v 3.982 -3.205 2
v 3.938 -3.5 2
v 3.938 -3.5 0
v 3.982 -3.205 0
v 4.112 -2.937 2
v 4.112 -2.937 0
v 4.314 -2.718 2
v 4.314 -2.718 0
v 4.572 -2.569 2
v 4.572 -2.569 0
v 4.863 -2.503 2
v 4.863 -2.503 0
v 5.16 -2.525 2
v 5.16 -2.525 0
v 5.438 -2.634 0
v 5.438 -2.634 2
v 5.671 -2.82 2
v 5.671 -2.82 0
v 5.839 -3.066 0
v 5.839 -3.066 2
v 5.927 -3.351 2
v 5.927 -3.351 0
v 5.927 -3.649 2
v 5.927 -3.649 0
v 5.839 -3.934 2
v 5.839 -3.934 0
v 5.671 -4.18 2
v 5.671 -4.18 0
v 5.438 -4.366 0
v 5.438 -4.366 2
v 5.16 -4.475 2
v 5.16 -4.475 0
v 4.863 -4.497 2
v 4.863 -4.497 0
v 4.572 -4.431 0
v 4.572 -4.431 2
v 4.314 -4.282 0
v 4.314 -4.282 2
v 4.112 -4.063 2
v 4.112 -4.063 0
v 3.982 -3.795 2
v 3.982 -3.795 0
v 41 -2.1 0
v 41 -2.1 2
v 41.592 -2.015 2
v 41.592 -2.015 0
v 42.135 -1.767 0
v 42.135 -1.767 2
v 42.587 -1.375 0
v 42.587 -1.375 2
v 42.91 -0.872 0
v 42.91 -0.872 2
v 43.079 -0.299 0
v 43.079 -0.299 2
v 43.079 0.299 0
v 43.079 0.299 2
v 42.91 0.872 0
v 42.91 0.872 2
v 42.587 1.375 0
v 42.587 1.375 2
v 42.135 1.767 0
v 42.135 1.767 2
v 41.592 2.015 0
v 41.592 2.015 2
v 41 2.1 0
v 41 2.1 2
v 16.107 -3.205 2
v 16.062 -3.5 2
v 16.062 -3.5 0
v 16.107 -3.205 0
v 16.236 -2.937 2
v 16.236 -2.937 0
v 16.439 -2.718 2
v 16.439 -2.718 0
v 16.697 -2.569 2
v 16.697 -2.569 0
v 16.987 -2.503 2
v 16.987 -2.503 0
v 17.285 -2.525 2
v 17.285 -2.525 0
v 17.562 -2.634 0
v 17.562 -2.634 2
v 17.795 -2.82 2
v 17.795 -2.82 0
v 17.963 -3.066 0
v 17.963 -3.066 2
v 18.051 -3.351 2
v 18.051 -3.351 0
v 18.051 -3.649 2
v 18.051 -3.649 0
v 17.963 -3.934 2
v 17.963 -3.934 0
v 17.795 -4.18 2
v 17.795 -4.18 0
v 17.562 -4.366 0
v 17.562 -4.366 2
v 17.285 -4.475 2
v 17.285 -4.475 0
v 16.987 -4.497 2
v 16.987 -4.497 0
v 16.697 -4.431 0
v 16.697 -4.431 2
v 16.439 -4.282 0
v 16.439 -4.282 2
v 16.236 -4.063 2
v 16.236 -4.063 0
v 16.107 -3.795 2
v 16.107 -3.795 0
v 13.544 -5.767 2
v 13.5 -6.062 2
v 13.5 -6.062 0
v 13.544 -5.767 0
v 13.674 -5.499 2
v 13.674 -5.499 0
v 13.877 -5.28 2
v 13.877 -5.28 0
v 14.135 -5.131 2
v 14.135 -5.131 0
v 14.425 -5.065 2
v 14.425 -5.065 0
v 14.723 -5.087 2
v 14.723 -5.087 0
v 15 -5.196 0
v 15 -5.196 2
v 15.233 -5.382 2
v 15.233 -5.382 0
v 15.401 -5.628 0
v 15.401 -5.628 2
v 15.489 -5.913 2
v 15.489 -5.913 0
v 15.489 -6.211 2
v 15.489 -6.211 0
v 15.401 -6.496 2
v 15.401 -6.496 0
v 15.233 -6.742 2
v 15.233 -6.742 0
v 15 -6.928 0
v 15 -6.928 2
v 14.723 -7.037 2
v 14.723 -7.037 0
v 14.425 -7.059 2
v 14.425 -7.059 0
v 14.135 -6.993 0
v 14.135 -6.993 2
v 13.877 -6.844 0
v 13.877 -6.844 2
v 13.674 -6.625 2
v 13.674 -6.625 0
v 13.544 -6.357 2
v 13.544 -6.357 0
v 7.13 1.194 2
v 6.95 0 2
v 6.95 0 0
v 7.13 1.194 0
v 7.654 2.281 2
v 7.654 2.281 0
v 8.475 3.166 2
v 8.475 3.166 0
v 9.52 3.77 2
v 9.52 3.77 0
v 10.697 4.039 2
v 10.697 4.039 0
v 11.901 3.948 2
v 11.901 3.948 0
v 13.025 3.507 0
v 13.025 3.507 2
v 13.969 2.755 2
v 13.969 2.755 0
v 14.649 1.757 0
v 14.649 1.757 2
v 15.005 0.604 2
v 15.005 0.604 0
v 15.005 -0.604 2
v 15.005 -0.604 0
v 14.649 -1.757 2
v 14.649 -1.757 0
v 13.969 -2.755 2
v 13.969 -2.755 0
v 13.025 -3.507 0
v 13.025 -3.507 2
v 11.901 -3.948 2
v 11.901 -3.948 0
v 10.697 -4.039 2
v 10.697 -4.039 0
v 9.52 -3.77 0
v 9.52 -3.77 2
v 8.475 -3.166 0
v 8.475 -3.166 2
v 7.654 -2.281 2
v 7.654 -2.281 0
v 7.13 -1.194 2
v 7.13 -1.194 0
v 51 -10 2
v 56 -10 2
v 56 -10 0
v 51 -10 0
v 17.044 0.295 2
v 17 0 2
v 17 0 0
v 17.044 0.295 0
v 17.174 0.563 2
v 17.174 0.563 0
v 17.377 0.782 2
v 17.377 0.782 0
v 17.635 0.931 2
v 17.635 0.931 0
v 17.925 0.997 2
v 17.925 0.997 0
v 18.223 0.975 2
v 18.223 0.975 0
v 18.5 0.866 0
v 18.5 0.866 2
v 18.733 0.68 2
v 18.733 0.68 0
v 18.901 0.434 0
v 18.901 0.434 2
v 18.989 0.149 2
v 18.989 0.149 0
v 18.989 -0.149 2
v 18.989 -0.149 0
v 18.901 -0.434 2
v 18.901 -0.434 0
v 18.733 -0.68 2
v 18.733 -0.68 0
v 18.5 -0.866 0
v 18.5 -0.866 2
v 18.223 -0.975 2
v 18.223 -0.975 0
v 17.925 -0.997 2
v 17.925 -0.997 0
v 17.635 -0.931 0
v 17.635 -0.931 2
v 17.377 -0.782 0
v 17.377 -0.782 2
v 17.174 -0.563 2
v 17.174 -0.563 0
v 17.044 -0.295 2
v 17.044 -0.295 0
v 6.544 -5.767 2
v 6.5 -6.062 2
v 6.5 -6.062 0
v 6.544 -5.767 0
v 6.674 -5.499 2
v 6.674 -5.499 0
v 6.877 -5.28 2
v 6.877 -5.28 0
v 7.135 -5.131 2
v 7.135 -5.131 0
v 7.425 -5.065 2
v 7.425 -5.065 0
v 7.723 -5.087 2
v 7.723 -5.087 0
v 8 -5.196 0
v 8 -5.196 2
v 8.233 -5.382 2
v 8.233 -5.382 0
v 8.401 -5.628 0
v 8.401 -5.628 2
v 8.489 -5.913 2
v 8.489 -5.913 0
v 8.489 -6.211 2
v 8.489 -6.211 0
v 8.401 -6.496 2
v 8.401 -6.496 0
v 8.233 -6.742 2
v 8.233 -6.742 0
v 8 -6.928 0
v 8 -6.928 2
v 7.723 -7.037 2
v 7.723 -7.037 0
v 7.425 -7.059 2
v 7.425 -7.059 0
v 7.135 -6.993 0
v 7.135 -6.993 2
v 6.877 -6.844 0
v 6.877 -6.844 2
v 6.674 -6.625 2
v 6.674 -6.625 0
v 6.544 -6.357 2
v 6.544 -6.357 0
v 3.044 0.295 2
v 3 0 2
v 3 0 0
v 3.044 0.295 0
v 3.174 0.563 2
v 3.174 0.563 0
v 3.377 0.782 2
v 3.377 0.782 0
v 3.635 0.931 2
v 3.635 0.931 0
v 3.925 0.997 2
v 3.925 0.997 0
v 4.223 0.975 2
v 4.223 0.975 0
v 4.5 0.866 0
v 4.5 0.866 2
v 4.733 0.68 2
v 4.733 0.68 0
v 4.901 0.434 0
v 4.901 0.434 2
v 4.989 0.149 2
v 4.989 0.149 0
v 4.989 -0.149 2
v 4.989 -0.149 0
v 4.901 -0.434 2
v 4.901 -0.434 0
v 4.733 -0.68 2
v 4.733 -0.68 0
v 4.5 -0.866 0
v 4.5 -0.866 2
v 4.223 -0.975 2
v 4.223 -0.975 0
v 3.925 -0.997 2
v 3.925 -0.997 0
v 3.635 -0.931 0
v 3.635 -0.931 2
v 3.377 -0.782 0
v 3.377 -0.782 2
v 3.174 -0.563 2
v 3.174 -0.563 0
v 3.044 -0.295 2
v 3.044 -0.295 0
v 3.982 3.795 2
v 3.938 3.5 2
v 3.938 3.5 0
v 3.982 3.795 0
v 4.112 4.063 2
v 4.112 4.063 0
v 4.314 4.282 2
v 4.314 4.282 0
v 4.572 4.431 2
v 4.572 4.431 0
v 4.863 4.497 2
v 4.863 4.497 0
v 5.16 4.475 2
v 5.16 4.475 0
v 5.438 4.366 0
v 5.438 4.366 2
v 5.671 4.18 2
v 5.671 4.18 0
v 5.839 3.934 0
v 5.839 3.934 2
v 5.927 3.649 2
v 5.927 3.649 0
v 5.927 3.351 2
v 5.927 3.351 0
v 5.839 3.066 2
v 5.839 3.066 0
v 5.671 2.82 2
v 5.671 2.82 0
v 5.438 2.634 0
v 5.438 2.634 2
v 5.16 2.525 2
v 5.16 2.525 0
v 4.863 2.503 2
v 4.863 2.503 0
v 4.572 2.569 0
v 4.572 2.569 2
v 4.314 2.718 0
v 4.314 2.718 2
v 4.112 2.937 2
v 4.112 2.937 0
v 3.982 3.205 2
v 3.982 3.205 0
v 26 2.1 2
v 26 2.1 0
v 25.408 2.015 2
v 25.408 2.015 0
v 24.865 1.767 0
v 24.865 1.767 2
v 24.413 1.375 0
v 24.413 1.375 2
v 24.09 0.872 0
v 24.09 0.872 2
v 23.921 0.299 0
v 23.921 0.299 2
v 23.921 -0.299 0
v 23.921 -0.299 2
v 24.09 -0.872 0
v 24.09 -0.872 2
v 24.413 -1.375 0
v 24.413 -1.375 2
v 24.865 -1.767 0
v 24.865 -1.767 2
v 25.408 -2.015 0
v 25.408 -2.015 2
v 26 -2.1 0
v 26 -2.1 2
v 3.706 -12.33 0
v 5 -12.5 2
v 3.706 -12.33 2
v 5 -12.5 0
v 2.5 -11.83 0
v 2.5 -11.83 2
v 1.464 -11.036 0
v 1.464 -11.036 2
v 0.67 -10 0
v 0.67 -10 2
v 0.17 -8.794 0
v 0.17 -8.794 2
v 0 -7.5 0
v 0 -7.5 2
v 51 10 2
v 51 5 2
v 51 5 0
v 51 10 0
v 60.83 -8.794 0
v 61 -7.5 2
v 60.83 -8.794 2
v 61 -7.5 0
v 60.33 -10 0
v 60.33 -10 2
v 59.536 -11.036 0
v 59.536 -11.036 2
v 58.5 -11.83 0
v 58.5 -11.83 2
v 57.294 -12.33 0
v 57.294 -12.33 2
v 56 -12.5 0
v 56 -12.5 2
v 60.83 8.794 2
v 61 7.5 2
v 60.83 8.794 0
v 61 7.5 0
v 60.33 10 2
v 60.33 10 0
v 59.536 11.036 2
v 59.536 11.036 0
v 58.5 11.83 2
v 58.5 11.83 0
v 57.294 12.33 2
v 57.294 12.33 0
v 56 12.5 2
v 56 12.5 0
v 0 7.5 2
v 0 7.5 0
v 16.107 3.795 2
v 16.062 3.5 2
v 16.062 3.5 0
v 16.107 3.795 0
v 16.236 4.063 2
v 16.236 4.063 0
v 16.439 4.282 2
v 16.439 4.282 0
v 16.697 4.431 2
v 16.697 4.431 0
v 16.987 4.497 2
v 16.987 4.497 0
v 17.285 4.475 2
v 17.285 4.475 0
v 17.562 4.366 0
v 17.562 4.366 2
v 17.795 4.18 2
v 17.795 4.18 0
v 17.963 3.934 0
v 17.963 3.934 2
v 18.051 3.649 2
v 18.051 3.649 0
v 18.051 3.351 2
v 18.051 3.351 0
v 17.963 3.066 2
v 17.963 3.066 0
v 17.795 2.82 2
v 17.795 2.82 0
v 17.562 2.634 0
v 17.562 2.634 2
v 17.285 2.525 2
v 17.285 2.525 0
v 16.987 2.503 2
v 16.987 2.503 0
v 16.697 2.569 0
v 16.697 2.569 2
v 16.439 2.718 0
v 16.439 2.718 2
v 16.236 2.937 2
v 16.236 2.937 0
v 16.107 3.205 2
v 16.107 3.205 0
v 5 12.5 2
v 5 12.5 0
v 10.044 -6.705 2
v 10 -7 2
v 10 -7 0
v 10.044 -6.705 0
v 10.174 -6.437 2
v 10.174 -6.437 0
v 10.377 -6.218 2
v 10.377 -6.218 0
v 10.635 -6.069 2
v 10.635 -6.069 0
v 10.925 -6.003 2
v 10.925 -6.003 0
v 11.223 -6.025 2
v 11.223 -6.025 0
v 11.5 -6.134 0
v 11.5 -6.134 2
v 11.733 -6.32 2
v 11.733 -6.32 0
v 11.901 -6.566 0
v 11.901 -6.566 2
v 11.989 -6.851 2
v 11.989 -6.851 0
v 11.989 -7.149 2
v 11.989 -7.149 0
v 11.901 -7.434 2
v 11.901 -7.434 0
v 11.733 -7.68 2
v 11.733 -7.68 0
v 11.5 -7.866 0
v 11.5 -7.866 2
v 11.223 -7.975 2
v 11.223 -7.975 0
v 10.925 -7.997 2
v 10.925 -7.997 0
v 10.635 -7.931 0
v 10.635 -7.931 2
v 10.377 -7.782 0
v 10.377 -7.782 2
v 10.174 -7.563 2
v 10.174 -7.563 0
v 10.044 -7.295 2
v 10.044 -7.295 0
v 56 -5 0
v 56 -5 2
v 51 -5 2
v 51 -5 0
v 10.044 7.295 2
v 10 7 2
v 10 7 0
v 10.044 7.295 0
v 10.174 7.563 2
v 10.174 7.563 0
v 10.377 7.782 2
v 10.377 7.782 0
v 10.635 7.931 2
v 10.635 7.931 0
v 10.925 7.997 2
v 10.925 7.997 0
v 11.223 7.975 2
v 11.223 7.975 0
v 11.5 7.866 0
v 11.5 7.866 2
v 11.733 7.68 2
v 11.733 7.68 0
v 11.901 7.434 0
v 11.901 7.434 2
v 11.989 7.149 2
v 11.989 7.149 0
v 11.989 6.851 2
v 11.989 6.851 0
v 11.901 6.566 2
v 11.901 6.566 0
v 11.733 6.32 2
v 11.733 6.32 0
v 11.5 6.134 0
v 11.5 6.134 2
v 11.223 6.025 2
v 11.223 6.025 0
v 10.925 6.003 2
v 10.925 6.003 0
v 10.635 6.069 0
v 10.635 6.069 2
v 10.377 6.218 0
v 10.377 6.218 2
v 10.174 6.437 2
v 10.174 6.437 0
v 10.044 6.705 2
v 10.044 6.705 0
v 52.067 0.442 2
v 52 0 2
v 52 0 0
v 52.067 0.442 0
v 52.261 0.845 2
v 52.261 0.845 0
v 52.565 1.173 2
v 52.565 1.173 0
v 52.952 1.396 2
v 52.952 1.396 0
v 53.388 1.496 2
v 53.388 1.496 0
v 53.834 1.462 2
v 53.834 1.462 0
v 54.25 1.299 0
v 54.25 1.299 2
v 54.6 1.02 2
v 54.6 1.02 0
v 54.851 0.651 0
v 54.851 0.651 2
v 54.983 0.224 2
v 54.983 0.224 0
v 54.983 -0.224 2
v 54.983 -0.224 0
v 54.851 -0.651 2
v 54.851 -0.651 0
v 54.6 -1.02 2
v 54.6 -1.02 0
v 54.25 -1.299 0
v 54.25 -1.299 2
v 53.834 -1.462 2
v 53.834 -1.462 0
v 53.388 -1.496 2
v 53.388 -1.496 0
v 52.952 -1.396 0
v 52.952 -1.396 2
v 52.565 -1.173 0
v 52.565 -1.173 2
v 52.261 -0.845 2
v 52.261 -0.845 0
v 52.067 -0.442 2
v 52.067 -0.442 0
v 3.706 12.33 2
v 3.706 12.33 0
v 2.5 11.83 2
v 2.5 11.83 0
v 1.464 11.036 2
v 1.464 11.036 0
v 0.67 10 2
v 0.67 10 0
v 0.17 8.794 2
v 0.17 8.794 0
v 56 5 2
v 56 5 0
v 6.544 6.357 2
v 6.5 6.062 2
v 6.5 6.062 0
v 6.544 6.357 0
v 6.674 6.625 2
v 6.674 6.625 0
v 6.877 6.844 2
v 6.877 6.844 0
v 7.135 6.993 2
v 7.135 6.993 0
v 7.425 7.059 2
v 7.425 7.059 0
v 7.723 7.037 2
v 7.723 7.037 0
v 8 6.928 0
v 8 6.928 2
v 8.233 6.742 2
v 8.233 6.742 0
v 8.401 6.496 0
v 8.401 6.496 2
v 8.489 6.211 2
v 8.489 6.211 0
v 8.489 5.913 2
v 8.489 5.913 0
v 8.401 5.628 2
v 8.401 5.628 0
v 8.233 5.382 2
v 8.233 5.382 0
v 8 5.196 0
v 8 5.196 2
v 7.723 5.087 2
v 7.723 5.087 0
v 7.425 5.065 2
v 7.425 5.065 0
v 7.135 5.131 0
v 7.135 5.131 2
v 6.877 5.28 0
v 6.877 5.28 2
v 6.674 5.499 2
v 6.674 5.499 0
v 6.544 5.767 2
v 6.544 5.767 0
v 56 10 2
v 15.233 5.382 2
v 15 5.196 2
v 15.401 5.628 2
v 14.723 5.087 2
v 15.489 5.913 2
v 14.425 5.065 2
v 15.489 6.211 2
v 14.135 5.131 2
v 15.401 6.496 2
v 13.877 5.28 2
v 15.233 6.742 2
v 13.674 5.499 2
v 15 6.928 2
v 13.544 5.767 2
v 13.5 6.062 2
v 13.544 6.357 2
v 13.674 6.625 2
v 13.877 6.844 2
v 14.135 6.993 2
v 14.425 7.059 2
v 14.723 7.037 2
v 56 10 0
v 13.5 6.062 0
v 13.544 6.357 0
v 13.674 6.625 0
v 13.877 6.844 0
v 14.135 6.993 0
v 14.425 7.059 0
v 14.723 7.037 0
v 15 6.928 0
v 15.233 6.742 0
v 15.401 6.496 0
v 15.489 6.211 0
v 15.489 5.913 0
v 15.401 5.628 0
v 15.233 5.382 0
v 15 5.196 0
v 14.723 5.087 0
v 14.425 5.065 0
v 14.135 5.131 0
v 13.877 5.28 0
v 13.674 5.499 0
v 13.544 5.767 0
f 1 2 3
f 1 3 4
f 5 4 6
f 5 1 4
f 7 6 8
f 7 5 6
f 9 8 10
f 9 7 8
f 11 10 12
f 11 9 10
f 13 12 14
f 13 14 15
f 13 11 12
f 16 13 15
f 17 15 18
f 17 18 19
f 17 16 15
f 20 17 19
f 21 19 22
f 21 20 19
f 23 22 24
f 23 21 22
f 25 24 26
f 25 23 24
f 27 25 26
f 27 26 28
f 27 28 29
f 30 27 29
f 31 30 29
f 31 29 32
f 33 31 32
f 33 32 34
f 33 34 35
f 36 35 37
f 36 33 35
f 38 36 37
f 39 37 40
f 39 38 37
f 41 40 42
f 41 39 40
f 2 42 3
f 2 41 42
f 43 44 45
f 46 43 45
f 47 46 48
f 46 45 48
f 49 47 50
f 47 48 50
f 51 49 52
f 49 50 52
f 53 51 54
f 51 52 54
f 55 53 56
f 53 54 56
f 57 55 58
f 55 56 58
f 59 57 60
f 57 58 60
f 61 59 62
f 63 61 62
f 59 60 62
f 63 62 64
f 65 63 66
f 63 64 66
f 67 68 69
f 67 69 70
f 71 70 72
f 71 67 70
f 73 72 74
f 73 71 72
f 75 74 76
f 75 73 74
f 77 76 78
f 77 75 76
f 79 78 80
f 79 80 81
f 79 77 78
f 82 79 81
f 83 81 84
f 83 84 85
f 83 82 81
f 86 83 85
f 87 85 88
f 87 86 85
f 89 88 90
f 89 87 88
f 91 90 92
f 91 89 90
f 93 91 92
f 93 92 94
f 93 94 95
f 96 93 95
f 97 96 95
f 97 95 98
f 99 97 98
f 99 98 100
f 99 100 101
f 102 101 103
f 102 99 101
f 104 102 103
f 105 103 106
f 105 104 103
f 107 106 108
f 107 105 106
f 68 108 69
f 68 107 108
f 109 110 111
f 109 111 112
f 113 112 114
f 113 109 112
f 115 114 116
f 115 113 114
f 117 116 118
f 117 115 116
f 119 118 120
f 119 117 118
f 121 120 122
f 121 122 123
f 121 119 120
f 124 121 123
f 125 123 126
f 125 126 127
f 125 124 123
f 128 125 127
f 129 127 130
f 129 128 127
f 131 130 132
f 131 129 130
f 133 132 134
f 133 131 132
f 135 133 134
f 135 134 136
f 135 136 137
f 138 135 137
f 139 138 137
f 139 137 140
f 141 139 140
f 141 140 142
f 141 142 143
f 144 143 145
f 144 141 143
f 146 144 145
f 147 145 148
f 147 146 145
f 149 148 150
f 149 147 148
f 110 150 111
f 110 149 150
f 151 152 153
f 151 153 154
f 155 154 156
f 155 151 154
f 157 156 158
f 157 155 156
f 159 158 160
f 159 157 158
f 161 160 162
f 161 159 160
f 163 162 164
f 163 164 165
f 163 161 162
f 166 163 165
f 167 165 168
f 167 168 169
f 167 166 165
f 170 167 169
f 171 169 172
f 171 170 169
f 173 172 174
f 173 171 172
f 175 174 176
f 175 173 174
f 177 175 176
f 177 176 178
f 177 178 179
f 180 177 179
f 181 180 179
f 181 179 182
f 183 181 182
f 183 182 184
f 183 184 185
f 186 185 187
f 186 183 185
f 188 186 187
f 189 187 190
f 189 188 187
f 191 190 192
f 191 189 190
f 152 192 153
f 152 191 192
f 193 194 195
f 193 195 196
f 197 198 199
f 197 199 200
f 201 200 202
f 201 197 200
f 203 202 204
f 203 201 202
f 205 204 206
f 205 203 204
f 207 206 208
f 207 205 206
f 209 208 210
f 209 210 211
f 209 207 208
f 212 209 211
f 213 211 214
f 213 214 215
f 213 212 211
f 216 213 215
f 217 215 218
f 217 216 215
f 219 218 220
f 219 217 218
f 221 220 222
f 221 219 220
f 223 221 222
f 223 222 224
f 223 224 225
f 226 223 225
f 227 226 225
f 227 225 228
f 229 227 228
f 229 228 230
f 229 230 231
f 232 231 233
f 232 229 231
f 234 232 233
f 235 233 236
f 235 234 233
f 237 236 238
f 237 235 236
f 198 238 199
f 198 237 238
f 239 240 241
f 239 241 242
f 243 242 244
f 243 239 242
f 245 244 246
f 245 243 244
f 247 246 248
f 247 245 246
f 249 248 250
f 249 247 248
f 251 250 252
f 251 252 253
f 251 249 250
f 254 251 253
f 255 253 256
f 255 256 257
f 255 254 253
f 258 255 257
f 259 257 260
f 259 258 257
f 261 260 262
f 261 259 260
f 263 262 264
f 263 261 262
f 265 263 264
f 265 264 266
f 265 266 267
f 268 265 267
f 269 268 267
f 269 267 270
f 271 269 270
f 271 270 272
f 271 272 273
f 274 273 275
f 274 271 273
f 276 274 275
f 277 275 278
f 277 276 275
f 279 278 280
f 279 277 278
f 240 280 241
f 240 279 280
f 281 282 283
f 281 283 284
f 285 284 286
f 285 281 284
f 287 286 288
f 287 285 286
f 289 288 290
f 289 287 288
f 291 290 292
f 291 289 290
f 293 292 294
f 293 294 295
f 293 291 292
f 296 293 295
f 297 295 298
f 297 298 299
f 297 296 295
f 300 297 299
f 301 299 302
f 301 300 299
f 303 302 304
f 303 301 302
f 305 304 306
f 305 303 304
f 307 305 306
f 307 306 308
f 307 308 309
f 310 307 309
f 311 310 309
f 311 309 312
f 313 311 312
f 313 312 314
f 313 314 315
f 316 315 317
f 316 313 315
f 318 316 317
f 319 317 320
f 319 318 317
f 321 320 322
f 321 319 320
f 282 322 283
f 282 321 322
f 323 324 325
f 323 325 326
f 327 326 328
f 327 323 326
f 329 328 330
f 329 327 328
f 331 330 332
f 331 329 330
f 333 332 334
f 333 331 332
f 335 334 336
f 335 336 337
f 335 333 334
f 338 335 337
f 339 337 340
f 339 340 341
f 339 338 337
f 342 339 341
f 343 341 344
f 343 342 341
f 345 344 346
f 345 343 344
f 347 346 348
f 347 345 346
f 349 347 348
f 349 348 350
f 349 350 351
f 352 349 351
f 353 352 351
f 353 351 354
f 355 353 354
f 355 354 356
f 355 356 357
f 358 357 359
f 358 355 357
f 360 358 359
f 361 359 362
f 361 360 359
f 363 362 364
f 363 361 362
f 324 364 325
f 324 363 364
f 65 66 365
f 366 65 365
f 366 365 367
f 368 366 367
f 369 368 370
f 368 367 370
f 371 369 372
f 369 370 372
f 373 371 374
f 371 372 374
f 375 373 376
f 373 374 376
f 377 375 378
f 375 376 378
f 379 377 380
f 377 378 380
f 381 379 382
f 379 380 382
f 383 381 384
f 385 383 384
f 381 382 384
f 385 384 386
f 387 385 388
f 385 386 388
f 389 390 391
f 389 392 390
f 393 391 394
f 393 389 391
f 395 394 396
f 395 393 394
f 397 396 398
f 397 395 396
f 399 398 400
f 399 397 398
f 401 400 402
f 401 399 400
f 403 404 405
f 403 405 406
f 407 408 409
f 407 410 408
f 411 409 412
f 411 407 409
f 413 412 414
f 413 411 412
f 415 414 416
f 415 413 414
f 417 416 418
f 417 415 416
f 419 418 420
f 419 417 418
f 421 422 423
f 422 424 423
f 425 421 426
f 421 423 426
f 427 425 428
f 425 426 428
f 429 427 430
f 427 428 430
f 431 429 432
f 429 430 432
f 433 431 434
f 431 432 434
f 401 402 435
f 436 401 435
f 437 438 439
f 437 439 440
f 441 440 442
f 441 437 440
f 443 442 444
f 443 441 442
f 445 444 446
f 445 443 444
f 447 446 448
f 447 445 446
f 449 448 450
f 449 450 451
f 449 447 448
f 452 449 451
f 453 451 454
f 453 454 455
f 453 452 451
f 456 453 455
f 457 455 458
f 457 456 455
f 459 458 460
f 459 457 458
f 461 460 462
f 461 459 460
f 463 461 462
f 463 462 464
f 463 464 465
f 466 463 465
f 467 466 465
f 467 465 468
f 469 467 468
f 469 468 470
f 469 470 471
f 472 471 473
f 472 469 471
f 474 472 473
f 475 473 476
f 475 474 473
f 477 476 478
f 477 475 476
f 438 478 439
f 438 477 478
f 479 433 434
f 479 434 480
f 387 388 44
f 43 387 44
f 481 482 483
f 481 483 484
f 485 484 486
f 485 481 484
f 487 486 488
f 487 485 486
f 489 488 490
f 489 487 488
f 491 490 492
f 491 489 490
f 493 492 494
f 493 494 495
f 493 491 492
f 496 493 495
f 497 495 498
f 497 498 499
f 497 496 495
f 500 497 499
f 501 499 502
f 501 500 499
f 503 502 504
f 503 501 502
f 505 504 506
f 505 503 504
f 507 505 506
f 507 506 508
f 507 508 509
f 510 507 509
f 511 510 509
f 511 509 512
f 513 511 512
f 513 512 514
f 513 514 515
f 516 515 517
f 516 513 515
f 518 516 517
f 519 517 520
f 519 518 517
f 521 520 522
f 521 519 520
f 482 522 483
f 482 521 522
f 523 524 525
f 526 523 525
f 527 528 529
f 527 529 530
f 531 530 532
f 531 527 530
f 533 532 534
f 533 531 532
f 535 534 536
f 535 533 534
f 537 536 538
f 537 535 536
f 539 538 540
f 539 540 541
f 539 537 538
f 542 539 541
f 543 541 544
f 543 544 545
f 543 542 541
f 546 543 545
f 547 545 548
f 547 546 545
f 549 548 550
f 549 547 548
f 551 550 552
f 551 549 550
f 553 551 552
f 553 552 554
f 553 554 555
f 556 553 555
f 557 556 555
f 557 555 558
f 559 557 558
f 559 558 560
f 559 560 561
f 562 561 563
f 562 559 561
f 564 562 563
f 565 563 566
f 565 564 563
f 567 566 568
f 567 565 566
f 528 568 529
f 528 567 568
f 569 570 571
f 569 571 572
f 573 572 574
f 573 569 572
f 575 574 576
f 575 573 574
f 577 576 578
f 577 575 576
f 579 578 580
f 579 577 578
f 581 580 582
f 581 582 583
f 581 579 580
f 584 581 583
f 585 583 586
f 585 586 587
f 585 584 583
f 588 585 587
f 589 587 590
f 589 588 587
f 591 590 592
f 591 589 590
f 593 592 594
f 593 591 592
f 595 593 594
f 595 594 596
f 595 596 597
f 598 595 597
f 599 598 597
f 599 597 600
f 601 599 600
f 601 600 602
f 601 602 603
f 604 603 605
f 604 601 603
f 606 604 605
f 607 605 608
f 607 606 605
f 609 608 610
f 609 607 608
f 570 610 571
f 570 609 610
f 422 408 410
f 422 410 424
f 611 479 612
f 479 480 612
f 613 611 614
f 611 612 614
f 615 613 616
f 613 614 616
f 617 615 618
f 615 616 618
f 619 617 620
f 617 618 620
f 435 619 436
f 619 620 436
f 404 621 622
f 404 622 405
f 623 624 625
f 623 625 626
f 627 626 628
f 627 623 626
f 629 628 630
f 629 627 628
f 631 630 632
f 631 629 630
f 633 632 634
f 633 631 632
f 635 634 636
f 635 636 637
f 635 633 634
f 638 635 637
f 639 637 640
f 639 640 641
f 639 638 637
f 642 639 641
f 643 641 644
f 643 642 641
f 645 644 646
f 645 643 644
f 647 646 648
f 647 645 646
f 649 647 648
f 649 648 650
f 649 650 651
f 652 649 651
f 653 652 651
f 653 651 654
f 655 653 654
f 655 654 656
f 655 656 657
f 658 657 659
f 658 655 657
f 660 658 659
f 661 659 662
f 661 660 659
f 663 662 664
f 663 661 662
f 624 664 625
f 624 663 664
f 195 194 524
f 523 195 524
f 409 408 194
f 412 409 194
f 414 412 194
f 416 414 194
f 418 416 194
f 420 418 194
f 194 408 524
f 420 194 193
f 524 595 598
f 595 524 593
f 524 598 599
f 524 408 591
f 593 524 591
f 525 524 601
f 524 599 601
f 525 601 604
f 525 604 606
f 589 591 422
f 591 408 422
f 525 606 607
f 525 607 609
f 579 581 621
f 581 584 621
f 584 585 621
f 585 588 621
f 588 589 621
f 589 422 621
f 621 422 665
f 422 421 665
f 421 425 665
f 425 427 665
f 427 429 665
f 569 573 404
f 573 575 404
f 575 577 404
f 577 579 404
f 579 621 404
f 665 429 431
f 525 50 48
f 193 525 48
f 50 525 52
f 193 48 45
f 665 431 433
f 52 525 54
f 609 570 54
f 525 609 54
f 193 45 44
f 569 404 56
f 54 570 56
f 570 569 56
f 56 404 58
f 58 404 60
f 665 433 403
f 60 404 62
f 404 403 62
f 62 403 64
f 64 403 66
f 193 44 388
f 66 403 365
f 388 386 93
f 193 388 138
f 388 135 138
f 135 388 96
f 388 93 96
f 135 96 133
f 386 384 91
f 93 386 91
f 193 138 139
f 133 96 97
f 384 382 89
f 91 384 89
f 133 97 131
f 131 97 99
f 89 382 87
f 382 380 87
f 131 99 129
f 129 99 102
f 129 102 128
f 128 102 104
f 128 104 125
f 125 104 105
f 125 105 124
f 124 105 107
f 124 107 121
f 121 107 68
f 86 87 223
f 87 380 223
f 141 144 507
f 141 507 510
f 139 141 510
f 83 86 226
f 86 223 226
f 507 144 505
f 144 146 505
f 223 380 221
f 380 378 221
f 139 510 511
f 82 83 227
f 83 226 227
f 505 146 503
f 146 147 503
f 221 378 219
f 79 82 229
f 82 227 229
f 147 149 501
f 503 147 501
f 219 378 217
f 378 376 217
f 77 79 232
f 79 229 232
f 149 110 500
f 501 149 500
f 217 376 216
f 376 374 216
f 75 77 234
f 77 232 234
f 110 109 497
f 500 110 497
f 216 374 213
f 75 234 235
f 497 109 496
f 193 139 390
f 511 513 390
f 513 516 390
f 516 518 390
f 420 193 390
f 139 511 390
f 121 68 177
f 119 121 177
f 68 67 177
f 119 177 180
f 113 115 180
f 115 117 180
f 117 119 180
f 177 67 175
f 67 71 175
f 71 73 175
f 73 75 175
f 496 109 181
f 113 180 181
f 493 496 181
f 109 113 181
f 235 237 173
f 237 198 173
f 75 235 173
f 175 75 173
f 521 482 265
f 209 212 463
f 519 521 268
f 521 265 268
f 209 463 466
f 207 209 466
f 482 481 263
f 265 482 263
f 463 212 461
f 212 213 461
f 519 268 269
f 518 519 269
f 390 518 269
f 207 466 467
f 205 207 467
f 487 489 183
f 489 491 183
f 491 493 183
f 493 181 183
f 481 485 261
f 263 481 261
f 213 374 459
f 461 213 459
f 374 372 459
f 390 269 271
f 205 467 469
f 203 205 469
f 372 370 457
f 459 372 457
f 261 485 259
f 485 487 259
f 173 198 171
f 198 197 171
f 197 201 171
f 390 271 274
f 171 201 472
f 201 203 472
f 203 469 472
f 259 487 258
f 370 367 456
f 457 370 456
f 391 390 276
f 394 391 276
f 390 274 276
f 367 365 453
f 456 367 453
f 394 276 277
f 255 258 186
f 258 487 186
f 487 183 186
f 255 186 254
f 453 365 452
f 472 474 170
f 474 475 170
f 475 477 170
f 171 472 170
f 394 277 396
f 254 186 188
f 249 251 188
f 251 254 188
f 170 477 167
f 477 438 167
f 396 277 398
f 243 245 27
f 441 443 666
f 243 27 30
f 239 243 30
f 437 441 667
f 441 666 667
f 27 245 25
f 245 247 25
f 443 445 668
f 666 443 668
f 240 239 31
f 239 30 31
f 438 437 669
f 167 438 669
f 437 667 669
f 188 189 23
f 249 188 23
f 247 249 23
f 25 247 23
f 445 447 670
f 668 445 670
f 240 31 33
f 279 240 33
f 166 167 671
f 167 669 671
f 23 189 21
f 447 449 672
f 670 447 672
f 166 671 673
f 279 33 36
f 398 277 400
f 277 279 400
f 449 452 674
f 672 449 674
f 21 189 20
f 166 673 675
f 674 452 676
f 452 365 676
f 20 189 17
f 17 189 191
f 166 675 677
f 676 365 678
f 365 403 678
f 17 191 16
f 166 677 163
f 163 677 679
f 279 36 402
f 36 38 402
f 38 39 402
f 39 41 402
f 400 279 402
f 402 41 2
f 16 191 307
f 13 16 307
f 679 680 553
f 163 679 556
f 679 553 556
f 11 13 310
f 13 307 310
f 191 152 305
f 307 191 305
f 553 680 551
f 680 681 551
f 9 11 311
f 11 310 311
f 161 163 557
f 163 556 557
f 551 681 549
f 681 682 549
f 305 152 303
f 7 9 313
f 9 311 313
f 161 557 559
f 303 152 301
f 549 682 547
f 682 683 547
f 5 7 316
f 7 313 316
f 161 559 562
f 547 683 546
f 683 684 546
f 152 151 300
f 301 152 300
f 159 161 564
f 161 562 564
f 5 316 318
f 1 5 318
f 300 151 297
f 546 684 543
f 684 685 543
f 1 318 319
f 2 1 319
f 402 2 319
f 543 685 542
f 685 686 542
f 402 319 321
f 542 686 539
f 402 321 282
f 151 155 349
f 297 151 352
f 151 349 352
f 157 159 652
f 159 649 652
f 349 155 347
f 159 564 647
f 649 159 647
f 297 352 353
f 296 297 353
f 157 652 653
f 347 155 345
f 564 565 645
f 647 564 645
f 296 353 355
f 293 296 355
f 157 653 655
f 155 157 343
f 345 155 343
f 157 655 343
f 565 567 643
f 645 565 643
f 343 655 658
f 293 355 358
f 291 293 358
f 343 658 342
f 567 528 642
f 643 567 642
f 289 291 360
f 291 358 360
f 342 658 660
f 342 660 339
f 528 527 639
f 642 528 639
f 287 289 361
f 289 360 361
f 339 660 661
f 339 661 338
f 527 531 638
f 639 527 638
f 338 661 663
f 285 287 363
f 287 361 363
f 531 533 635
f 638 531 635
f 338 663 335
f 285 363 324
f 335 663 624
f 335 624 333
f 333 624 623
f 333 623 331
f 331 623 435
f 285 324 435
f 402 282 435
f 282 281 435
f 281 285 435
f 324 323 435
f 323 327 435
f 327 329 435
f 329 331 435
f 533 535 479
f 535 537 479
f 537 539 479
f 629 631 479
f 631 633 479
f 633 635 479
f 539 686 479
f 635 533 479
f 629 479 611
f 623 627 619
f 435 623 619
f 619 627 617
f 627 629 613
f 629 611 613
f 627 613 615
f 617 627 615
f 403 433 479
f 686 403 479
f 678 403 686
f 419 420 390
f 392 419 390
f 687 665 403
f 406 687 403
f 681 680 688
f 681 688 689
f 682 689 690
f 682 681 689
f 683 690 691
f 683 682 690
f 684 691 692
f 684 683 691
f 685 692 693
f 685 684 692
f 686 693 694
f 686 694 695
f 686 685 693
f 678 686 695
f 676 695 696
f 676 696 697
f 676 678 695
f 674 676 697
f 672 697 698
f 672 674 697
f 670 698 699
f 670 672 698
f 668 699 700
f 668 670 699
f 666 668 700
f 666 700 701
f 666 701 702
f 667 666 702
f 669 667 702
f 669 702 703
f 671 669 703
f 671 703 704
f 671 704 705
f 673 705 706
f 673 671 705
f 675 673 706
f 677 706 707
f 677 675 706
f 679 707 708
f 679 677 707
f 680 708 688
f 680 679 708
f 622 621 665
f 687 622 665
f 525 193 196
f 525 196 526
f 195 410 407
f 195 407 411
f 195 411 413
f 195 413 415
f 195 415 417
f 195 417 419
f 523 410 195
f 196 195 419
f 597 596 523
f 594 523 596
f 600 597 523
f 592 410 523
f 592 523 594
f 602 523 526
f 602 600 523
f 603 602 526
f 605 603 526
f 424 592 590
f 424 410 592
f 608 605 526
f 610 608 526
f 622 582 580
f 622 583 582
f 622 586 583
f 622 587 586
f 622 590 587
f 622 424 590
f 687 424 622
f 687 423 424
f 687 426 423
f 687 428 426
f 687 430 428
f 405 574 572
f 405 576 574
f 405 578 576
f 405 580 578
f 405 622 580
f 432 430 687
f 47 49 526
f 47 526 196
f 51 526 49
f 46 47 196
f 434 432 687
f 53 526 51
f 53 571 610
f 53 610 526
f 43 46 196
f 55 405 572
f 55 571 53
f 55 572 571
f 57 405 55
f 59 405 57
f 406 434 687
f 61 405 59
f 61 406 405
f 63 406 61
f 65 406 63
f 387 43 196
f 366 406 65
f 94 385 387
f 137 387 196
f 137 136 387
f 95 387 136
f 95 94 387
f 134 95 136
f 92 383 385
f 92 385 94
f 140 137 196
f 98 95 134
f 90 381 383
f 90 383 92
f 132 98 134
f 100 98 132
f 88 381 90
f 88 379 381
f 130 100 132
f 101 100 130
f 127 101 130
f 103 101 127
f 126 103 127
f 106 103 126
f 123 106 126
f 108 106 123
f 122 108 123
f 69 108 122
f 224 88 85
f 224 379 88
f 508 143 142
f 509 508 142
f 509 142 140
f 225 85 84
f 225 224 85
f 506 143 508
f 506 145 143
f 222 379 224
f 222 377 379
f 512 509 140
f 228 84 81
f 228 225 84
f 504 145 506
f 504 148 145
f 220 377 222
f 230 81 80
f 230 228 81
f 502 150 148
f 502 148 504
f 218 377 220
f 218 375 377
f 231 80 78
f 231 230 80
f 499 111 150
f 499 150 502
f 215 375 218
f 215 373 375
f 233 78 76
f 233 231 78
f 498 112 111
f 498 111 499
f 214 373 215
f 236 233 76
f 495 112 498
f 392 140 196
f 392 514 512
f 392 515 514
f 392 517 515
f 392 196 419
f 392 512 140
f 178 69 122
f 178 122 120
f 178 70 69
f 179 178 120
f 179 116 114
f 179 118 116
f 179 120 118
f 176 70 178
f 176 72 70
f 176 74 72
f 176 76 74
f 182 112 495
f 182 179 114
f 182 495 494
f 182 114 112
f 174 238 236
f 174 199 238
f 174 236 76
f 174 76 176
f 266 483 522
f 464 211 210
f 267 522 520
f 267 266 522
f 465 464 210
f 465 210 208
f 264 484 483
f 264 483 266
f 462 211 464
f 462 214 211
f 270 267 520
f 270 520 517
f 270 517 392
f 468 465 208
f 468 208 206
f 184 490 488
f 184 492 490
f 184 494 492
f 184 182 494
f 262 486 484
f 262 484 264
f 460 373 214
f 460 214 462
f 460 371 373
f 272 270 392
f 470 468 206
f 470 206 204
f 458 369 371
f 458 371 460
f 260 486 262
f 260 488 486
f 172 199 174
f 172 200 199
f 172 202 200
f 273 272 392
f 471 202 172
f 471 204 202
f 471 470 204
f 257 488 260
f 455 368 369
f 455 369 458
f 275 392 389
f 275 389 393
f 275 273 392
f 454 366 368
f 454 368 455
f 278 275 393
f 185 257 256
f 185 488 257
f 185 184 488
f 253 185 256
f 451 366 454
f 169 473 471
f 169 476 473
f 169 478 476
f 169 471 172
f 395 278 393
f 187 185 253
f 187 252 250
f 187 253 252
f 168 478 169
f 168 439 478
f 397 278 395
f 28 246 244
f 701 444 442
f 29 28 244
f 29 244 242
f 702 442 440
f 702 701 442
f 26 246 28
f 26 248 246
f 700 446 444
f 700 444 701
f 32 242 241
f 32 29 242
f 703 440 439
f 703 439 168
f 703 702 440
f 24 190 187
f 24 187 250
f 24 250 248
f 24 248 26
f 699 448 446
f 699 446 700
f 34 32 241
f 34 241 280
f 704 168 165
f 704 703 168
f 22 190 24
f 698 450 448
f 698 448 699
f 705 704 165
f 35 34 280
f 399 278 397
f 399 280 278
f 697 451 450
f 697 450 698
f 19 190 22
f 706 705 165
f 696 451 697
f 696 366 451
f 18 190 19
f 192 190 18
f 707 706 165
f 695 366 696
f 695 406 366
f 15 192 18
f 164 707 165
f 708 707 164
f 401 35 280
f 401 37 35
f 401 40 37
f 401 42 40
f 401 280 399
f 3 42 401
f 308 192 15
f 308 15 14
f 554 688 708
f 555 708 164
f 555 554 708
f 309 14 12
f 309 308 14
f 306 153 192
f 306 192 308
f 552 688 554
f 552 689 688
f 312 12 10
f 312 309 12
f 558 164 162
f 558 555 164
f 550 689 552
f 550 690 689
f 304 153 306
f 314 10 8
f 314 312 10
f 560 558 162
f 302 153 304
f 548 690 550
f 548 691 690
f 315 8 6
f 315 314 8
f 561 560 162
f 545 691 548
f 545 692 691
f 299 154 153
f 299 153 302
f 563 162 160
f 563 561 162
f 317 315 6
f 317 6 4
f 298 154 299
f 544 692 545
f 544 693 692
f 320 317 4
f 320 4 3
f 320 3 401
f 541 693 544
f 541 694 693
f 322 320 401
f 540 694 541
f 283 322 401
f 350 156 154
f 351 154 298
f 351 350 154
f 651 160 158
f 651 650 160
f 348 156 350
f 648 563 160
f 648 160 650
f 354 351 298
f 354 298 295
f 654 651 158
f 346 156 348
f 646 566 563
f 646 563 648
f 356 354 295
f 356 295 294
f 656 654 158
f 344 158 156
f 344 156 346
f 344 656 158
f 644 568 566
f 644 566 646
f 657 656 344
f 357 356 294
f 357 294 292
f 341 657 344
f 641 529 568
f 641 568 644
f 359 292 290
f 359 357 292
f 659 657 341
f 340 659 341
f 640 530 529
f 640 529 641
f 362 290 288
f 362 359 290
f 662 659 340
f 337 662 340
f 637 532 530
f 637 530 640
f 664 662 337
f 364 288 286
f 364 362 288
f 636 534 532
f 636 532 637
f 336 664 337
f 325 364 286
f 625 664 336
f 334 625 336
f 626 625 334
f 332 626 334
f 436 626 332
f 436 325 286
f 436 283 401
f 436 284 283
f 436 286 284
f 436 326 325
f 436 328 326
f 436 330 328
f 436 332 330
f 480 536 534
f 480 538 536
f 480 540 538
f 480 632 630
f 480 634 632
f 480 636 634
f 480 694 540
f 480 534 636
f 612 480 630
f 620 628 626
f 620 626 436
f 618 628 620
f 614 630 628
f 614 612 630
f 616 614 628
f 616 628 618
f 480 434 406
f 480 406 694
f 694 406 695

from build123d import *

# Parameters (mm, degrees)
BOSS_EXTRU_1_START       = -2
BOSS_EXTRU_1_OUTLINE_W   = 61
BOSS_EXTRU_1_OUTLINE_H   = 25
BOSS_EXTRU_1_OUTLINE_W_2 = 5
BOSS_EXTRU_1_OUTLINE_H_2 = 5
BOSS_EXTRU_1_OUTLINE_R   = 1
BOSS_EXTRU_1_OUTLINE_R_2 = 1.5
BOSS_EXTRU_1_OUTLINE_R_3 = 4.05
BOSS_EXTRU_1_DEPTH       = 2
CONG_1_R                 = 5


# Read off the part's stored shape, not the designer's step: Boss.-Extru.1
with BuildPart() as part:
    # Boss.-Extru.1 outline → Boss.-Extru.1 (new body)
    with BuildSketch(Plane(origin=(0, 0, 0), x_dir=(-1, 0, 0), z_dir=(0, 0, -1)).offset(BOSS_EXTRU_1_START)):
        with Locations((-30.5, 0)):
            Rectangle(BOSS_EXTRU_1_OUTLINE_W, BOSS_EXTRU_1_OUTLINE_H)
        with Locations((-53.5, -7.5)):
            Rectangle(BOSS_EXTRU_1_OUTLINE_W_2, BOSS_EXTRU_1_OUTLINE_H_2, mode=Mode.SUBTRACT)
        with Locations((-11, -7)):
            Circle(BOSS_EXTRU_1_OUTLINE_R, mode=Mode.SUBTRACT)
        with Locations((-17.062177826, -3.5)):
            Circle(BOSS_EXTRU_1_OUTLINE_R, mode=Mode.SUBTRACT)
        with Locations((-14.5, -6.062177826)):
            Circle(BOSS_EXTRU_1_OUTLINE_R, mode=Mode.SUBTRACT)
        with Locations((-7.5, -6.062177826)):
            Circle(BOSS_EXTRU_1_OUTLINE_R, mode=Mode.SUBTRACT)
        with Locations((-4.937822174, -3.5)):
            Circle(BOSS_EXTRU_1_OUTLINE_R, mode=Mode.SUBTRACT)
        with Locations((-53.5, 0)):
            Circle(BOSS_EXTRU_1_OUTLINE_R_2, mode=Mode.SUBTRACT)
        with BuildLine():
            ThreePointArc((-26, 2.1), (-23.9, 0), (-26, -2.1))
            Line((-26, -2.1), (-41, -2.1))
            ThreePointArc((-41, -2.1), (-43.1, 0), (-41, 2.1))
            Line((-41, 2.1), (-26, 2.1))
        make_face(mode=Mode.SUBTRACT)
        with Locations((-53.5, 7.5)):
            Rectangle(BOSS_EXTRU_1_OUTLINE_W_2, BOSS_EXTRU_1_OUTLINE_H_2, mode=Mode.SUBTRACT)
        with Locations((-18, 0)):
            Circle(BOSS_EXTRU_1_OUTLINE_R, mode=Mode.SUBTRACT)
        with Locations((-17.062177826, 3.5)):
            Circle(BOSS_EXTRU_1_OUTLINE_R, mode=Mode.SUBTRACT)
        with Locations((-11, 0)):
            Circle(BOSS_EXTRU_1_OUTLINE_R_3, mode=Mode.SUBTRACT)
        with Locations((-4, 0)):
            Circle(BOSS_EXTRU_1_OUTLINE_R, mode=Mode.SUBTRACT)
        with Locations((-14.5, 6.062177826)):
            Circle(BOSS_EXTRU_1_OUTLINE_R, mode=Mode.SUBTRACT)
        with Locations((-4.937822174, 3.5)):
            Circle(BOSS_EXTRU_1_OUTLINE_R, mode=Mode.SUBTRACT)
        with Locations((-7.5, 6.062177826)):
            Circle(BOSS_EXTRU_1_OUTLINE_R, mode=Mode.SUBTRACT)
        with Locations((-11, 7)):
            Circle(BOSS_EXTRU_1_OUTLINE_R, mode=Mode.SUBTRACT)
    extrude(amount=BOSS_EXTRU_1_DEPTH)

    # Congé1
    cong_1_edges = [part.edges().sort_by_distance(p)[0] for p in [
        (61, 12.5, 1),
        (0, 12.5, 1),
        (0, -12.5, 1),
        (61, -12.5, 1),
    ]]
    fillet(cong_1_edges, radius=CONG_1_R)


solid = part.part
